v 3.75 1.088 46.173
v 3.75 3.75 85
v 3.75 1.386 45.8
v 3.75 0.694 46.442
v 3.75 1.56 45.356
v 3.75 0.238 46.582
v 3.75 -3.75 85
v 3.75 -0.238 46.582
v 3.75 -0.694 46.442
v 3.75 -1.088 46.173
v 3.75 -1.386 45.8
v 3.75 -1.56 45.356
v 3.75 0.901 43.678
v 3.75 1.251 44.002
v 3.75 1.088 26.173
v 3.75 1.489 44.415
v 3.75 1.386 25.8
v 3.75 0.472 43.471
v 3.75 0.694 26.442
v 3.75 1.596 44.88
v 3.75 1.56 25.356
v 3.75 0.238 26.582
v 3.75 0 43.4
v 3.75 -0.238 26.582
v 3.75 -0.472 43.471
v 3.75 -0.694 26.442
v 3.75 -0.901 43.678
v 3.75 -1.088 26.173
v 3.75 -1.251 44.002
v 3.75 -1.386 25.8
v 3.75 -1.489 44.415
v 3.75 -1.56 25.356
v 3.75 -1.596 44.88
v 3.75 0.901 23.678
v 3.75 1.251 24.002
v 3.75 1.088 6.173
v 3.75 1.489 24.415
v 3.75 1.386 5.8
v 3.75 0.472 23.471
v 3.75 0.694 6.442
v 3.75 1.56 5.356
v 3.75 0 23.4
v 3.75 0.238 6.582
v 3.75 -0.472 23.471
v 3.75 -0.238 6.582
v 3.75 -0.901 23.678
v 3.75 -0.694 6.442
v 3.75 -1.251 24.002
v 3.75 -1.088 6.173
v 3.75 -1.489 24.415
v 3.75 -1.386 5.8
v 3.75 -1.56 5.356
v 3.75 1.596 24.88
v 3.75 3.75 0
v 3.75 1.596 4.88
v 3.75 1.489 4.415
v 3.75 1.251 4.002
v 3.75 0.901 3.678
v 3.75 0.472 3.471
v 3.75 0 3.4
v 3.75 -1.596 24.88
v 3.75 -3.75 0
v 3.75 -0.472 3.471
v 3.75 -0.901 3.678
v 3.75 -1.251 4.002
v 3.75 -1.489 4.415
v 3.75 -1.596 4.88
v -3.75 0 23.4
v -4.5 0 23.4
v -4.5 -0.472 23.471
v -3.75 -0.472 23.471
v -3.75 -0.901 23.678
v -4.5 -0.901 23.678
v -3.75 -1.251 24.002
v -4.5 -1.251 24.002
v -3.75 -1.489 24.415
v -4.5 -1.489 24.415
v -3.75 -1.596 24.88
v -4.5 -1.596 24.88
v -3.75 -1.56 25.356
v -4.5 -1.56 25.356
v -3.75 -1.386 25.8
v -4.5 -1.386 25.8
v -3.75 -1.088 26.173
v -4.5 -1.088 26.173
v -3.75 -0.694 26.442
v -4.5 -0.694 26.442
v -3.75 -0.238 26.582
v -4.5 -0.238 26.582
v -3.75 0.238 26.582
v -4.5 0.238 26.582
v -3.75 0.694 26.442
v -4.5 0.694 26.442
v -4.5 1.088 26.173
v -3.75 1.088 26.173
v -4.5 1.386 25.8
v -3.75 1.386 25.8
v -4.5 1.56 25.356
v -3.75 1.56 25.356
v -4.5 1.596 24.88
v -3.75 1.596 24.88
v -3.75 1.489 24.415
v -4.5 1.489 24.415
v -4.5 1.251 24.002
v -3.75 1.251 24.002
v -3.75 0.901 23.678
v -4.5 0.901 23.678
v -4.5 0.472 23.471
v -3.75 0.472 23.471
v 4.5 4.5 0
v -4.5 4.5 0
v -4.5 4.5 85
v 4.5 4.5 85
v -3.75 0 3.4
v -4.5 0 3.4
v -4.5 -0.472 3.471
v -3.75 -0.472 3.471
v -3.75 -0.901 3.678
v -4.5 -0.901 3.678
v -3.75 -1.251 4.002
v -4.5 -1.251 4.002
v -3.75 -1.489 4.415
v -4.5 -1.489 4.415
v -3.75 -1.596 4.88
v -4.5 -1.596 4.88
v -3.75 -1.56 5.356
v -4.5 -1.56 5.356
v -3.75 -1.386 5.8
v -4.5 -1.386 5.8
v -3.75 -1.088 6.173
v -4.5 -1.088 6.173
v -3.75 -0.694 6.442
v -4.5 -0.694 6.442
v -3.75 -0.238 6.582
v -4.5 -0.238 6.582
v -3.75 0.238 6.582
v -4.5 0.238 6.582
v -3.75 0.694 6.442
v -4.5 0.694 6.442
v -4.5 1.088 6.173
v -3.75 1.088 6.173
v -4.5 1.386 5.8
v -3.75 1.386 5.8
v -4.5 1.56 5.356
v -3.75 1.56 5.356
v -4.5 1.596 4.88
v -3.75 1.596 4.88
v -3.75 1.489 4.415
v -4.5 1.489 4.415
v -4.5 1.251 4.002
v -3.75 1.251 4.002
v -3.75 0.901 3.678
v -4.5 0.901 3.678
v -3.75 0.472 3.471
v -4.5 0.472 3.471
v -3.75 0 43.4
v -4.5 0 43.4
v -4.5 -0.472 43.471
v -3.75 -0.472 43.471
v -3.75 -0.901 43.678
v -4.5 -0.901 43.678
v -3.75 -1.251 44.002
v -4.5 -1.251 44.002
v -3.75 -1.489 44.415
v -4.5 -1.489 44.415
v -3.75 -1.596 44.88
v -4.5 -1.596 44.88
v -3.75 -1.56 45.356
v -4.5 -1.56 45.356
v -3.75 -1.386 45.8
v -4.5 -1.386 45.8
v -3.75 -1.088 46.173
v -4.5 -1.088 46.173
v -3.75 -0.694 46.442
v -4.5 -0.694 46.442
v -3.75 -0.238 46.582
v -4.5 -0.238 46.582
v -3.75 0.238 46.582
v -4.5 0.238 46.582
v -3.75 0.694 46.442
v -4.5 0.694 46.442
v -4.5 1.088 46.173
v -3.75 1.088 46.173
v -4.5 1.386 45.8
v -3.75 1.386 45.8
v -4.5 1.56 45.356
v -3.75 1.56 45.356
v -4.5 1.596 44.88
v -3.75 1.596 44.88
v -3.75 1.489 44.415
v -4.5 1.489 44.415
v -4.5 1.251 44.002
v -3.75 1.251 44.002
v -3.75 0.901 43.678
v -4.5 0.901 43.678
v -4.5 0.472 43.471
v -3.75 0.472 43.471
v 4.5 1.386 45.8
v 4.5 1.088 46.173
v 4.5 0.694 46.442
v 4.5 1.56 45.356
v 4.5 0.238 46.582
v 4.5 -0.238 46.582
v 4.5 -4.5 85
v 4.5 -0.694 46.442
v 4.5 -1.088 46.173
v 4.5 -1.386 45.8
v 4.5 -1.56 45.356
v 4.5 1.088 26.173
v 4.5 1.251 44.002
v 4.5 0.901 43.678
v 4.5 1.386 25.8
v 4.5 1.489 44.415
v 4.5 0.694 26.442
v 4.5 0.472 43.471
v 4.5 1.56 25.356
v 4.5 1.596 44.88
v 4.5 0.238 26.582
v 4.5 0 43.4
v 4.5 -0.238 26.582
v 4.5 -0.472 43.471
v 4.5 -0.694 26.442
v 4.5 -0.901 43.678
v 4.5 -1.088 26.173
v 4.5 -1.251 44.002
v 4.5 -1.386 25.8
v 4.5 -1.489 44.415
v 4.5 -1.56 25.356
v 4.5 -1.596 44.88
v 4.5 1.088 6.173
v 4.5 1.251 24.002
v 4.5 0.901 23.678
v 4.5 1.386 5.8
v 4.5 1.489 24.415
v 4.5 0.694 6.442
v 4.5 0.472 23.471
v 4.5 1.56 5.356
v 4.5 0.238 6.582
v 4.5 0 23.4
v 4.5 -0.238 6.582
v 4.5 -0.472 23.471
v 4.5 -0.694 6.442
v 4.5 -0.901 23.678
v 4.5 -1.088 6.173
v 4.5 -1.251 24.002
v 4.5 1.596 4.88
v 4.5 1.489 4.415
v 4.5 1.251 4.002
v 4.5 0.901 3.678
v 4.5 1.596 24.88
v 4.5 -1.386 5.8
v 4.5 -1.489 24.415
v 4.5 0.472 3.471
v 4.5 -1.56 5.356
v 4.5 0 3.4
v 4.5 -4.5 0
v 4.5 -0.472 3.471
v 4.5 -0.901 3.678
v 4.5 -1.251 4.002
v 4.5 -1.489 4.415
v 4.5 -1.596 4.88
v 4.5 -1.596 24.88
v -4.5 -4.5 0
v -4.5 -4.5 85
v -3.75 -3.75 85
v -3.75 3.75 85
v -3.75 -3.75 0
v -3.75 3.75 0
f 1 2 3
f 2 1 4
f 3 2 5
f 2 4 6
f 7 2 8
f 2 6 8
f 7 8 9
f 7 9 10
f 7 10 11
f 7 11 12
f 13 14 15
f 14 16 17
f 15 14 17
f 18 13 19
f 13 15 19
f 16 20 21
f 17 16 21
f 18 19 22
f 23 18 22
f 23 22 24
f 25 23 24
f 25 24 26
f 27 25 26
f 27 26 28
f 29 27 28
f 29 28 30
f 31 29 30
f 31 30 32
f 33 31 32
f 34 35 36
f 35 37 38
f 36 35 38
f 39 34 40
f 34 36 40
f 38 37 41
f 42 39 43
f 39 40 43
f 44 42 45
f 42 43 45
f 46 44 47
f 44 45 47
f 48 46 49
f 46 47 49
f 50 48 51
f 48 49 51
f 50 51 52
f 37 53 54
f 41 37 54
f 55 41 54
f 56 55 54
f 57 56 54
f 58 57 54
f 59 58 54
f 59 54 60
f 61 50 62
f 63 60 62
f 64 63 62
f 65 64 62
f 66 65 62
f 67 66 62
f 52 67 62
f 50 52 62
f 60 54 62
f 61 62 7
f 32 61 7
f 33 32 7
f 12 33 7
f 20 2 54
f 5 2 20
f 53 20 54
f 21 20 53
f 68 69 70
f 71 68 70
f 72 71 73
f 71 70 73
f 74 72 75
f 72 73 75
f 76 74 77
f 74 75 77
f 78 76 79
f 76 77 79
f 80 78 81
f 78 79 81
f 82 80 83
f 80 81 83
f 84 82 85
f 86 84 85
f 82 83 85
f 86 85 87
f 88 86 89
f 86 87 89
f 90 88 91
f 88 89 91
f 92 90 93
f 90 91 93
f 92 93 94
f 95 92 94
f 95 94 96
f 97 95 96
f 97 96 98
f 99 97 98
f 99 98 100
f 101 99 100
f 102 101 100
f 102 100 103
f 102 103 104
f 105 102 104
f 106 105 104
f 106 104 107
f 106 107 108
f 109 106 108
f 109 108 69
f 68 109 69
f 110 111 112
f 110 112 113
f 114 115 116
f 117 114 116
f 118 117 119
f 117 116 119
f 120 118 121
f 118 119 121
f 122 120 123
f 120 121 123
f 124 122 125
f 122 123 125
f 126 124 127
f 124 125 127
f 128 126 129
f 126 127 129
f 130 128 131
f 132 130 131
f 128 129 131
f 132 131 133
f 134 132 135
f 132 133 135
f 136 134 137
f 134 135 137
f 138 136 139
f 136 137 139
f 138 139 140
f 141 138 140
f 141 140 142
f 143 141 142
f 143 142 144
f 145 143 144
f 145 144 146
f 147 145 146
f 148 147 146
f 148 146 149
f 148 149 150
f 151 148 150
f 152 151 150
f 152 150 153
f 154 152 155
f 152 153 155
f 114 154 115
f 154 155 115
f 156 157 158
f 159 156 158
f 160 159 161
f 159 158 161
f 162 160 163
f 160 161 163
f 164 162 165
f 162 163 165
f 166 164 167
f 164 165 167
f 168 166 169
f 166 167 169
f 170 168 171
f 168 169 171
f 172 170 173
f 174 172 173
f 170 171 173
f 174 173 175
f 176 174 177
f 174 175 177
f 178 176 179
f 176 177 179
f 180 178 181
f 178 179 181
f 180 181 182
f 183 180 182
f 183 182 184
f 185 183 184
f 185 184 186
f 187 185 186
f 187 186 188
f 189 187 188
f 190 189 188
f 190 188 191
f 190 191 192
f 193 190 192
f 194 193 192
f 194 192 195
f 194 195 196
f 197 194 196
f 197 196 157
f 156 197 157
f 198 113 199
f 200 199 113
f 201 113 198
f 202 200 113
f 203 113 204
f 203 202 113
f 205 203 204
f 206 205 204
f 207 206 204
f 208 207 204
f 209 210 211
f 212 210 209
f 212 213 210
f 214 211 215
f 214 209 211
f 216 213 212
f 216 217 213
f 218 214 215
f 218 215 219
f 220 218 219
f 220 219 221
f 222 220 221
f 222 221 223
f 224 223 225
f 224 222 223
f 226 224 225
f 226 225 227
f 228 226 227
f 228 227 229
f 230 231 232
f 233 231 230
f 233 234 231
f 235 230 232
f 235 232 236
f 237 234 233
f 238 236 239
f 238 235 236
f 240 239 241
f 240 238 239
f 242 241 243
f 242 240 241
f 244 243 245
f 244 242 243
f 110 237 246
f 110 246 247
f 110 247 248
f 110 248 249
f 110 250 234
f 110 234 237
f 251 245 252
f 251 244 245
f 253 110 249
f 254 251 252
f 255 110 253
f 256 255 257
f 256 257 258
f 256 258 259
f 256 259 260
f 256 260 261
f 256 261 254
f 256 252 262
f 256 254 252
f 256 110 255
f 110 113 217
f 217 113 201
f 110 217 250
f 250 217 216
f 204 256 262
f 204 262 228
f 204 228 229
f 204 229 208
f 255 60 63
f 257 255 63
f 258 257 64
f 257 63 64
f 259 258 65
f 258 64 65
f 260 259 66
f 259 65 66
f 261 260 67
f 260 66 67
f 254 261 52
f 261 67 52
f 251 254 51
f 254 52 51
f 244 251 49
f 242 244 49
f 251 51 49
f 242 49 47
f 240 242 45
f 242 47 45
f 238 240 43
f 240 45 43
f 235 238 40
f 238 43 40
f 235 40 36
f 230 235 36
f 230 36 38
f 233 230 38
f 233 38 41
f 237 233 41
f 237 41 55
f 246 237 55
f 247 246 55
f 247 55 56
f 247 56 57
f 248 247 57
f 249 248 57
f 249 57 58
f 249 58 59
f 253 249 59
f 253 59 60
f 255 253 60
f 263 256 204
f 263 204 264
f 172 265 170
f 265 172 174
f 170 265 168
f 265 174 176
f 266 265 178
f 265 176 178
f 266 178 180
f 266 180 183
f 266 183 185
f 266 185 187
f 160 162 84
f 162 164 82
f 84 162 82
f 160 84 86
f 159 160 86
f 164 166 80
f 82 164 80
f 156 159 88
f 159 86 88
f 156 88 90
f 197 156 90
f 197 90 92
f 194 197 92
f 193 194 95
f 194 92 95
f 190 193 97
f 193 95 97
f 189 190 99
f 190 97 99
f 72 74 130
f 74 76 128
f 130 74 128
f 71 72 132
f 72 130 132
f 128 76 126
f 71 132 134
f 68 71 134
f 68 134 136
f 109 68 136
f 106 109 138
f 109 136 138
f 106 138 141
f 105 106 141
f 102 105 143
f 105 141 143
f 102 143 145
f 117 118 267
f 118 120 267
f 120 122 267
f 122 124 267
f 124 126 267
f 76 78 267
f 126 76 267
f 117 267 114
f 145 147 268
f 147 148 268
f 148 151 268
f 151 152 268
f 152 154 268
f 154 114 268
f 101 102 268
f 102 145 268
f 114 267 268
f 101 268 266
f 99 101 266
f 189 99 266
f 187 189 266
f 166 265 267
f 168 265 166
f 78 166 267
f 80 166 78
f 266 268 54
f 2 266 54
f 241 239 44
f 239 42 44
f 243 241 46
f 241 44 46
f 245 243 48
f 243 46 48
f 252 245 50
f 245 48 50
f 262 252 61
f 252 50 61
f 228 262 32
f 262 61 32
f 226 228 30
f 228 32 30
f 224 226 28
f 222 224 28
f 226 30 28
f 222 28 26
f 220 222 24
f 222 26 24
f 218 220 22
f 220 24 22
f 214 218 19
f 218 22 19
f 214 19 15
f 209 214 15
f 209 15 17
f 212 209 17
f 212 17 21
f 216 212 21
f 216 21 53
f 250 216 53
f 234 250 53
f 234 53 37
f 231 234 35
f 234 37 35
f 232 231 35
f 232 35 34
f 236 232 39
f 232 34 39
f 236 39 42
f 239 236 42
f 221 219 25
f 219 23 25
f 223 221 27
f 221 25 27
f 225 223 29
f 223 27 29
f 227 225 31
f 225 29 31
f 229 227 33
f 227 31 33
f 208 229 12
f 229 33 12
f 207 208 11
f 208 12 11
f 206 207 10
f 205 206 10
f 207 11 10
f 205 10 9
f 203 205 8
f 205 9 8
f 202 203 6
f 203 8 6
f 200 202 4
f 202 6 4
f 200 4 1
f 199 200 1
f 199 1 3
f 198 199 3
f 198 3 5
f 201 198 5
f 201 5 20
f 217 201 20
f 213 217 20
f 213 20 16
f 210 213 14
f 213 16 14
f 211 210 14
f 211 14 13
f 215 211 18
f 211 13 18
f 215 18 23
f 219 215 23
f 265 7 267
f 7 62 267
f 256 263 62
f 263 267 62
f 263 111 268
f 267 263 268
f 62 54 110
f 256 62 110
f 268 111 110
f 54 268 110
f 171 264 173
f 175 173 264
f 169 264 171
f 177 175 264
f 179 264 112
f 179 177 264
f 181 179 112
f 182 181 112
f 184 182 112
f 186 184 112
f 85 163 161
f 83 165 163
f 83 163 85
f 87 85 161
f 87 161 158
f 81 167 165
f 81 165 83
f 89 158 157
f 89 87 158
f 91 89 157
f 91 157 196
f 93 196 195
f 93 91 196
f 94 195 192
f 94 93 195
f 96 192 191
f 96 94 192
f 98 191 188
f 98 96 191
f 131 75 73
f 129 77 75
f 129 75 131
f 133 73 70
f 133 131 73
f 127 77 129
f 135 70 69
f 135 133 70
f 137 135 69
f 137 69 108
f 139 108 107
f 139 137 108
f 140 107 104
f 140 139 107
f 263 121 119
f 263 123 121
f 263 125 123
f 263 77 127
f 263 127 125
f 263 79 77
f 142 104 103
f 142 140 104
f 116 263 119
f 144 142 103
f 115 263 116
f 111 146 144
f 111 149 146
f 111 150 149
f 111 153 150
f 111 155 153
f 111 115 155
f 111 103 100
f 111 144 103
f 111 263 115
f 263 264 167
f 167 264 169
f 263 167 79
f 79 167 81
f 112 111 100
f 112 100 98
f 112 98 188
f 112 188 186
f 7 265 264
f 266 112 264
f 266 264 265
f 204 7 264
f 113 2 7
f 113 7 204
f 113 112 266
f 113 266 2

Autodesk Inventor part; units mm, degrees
ref_plane "YZ Plane" through (0, 0, 0) normal (1, 0, 0) x (0, 1, 0)
ref_plane "XZ Plane" through (0, 0, 0) normal (0, 1, 0) x (-1, 0, 0)
ref_plane "XY Plane" through (0, 0, 0) normal (0, 0, 1) x (1, 0, 0)
sketch "スケッチ1" plane through (0, 0, 0) normal (0, 0, 1) x (1, 0, 0)
  line L0 (4.5, -4.5) -> (-4.5, -4.5)
  line L1 (-4.5, -4.5) -> (-4.5, 4.5)
  line L2 (-4.5, 4.5) -> (4.5, 4.5)
  line L3 (4.5, 4.5) -> (4.5, -4.5)
  line L4 (4.5, -4.5) -> (-4.5, 4.5) construction
  line L5 (-4.5, -4.5) -> (4.5, 4.5) construction
  line L6 (3.75, -3.75) -> (-3.75, -3.75)
  line L7 (-3.75, -3.75) -> (-3.75, 3.75)
  line L8 (-3.75, 3.75) -> (3.75, 3.75)
  line L9 (3.75, 3.75) -> (3.75, -3.75)
  line L10 (3.75, -3.75) -> (-3.75, 3.75) construction
  line L11 (-3.75, -3.75) -> (3.75, 3.75) construction
  point P0 (0, 0)
  dimension "d0" = 9
  dimension "d1" = 9
  dimension "d2" = 7.5
  dimension "d3" = 7.5
extrude "押し出し1" add sketch "スケッチ1" along normal blind 90
sketch "スケッチ2" plane through (4.5, -4.5, 0) normal (1, 0, 0) x (0, 0, -1)
  line L0 (0, 0) -> (-90, 0) projected
  line L1 (0, 0) -> (0, 9) projected
  point P0 (0, 4.5)
  point P1 (-5, 4.5)
  point P2 (-25, 4.5)
  point P3 (-45, 4.5)
  dimension "d6" = 4.5
  dimension "d7" = 5
  dimension "d8" = 20
  dimension "d9" = 20
hole "穴1" at (4.5, 0, 5) at (4.5, 0, 25) at (4.5, 0, 45) direction (-1, 0, 0) diameter 3.2 end through all
sketch "スケッチ3" plane through (0, 0, 90) normal (0, 0, 1) x (1, 0, 0)
  line L0 (4.5, -4.5) -> (-4.5, -4.5)
  line L1 (-4.5, -4.5) -> (-4.5, 4.5)
  line L2 (-4.5, 4.5) -> (4.5, 4.5)
  line L3 (4.5, 4.5) -> (4.5, -4.5)
  line L4 (4.5, -4.5) -> (-4.5, 4.5) construction
  line L5 (-4.5, -4.5) -> (4.5, 4.5) construction
  point P0 (0, 0)
extrude "押し出し2" cut sketch "スケッチ3" against normal blind 5
properties part number "squareEx1"
